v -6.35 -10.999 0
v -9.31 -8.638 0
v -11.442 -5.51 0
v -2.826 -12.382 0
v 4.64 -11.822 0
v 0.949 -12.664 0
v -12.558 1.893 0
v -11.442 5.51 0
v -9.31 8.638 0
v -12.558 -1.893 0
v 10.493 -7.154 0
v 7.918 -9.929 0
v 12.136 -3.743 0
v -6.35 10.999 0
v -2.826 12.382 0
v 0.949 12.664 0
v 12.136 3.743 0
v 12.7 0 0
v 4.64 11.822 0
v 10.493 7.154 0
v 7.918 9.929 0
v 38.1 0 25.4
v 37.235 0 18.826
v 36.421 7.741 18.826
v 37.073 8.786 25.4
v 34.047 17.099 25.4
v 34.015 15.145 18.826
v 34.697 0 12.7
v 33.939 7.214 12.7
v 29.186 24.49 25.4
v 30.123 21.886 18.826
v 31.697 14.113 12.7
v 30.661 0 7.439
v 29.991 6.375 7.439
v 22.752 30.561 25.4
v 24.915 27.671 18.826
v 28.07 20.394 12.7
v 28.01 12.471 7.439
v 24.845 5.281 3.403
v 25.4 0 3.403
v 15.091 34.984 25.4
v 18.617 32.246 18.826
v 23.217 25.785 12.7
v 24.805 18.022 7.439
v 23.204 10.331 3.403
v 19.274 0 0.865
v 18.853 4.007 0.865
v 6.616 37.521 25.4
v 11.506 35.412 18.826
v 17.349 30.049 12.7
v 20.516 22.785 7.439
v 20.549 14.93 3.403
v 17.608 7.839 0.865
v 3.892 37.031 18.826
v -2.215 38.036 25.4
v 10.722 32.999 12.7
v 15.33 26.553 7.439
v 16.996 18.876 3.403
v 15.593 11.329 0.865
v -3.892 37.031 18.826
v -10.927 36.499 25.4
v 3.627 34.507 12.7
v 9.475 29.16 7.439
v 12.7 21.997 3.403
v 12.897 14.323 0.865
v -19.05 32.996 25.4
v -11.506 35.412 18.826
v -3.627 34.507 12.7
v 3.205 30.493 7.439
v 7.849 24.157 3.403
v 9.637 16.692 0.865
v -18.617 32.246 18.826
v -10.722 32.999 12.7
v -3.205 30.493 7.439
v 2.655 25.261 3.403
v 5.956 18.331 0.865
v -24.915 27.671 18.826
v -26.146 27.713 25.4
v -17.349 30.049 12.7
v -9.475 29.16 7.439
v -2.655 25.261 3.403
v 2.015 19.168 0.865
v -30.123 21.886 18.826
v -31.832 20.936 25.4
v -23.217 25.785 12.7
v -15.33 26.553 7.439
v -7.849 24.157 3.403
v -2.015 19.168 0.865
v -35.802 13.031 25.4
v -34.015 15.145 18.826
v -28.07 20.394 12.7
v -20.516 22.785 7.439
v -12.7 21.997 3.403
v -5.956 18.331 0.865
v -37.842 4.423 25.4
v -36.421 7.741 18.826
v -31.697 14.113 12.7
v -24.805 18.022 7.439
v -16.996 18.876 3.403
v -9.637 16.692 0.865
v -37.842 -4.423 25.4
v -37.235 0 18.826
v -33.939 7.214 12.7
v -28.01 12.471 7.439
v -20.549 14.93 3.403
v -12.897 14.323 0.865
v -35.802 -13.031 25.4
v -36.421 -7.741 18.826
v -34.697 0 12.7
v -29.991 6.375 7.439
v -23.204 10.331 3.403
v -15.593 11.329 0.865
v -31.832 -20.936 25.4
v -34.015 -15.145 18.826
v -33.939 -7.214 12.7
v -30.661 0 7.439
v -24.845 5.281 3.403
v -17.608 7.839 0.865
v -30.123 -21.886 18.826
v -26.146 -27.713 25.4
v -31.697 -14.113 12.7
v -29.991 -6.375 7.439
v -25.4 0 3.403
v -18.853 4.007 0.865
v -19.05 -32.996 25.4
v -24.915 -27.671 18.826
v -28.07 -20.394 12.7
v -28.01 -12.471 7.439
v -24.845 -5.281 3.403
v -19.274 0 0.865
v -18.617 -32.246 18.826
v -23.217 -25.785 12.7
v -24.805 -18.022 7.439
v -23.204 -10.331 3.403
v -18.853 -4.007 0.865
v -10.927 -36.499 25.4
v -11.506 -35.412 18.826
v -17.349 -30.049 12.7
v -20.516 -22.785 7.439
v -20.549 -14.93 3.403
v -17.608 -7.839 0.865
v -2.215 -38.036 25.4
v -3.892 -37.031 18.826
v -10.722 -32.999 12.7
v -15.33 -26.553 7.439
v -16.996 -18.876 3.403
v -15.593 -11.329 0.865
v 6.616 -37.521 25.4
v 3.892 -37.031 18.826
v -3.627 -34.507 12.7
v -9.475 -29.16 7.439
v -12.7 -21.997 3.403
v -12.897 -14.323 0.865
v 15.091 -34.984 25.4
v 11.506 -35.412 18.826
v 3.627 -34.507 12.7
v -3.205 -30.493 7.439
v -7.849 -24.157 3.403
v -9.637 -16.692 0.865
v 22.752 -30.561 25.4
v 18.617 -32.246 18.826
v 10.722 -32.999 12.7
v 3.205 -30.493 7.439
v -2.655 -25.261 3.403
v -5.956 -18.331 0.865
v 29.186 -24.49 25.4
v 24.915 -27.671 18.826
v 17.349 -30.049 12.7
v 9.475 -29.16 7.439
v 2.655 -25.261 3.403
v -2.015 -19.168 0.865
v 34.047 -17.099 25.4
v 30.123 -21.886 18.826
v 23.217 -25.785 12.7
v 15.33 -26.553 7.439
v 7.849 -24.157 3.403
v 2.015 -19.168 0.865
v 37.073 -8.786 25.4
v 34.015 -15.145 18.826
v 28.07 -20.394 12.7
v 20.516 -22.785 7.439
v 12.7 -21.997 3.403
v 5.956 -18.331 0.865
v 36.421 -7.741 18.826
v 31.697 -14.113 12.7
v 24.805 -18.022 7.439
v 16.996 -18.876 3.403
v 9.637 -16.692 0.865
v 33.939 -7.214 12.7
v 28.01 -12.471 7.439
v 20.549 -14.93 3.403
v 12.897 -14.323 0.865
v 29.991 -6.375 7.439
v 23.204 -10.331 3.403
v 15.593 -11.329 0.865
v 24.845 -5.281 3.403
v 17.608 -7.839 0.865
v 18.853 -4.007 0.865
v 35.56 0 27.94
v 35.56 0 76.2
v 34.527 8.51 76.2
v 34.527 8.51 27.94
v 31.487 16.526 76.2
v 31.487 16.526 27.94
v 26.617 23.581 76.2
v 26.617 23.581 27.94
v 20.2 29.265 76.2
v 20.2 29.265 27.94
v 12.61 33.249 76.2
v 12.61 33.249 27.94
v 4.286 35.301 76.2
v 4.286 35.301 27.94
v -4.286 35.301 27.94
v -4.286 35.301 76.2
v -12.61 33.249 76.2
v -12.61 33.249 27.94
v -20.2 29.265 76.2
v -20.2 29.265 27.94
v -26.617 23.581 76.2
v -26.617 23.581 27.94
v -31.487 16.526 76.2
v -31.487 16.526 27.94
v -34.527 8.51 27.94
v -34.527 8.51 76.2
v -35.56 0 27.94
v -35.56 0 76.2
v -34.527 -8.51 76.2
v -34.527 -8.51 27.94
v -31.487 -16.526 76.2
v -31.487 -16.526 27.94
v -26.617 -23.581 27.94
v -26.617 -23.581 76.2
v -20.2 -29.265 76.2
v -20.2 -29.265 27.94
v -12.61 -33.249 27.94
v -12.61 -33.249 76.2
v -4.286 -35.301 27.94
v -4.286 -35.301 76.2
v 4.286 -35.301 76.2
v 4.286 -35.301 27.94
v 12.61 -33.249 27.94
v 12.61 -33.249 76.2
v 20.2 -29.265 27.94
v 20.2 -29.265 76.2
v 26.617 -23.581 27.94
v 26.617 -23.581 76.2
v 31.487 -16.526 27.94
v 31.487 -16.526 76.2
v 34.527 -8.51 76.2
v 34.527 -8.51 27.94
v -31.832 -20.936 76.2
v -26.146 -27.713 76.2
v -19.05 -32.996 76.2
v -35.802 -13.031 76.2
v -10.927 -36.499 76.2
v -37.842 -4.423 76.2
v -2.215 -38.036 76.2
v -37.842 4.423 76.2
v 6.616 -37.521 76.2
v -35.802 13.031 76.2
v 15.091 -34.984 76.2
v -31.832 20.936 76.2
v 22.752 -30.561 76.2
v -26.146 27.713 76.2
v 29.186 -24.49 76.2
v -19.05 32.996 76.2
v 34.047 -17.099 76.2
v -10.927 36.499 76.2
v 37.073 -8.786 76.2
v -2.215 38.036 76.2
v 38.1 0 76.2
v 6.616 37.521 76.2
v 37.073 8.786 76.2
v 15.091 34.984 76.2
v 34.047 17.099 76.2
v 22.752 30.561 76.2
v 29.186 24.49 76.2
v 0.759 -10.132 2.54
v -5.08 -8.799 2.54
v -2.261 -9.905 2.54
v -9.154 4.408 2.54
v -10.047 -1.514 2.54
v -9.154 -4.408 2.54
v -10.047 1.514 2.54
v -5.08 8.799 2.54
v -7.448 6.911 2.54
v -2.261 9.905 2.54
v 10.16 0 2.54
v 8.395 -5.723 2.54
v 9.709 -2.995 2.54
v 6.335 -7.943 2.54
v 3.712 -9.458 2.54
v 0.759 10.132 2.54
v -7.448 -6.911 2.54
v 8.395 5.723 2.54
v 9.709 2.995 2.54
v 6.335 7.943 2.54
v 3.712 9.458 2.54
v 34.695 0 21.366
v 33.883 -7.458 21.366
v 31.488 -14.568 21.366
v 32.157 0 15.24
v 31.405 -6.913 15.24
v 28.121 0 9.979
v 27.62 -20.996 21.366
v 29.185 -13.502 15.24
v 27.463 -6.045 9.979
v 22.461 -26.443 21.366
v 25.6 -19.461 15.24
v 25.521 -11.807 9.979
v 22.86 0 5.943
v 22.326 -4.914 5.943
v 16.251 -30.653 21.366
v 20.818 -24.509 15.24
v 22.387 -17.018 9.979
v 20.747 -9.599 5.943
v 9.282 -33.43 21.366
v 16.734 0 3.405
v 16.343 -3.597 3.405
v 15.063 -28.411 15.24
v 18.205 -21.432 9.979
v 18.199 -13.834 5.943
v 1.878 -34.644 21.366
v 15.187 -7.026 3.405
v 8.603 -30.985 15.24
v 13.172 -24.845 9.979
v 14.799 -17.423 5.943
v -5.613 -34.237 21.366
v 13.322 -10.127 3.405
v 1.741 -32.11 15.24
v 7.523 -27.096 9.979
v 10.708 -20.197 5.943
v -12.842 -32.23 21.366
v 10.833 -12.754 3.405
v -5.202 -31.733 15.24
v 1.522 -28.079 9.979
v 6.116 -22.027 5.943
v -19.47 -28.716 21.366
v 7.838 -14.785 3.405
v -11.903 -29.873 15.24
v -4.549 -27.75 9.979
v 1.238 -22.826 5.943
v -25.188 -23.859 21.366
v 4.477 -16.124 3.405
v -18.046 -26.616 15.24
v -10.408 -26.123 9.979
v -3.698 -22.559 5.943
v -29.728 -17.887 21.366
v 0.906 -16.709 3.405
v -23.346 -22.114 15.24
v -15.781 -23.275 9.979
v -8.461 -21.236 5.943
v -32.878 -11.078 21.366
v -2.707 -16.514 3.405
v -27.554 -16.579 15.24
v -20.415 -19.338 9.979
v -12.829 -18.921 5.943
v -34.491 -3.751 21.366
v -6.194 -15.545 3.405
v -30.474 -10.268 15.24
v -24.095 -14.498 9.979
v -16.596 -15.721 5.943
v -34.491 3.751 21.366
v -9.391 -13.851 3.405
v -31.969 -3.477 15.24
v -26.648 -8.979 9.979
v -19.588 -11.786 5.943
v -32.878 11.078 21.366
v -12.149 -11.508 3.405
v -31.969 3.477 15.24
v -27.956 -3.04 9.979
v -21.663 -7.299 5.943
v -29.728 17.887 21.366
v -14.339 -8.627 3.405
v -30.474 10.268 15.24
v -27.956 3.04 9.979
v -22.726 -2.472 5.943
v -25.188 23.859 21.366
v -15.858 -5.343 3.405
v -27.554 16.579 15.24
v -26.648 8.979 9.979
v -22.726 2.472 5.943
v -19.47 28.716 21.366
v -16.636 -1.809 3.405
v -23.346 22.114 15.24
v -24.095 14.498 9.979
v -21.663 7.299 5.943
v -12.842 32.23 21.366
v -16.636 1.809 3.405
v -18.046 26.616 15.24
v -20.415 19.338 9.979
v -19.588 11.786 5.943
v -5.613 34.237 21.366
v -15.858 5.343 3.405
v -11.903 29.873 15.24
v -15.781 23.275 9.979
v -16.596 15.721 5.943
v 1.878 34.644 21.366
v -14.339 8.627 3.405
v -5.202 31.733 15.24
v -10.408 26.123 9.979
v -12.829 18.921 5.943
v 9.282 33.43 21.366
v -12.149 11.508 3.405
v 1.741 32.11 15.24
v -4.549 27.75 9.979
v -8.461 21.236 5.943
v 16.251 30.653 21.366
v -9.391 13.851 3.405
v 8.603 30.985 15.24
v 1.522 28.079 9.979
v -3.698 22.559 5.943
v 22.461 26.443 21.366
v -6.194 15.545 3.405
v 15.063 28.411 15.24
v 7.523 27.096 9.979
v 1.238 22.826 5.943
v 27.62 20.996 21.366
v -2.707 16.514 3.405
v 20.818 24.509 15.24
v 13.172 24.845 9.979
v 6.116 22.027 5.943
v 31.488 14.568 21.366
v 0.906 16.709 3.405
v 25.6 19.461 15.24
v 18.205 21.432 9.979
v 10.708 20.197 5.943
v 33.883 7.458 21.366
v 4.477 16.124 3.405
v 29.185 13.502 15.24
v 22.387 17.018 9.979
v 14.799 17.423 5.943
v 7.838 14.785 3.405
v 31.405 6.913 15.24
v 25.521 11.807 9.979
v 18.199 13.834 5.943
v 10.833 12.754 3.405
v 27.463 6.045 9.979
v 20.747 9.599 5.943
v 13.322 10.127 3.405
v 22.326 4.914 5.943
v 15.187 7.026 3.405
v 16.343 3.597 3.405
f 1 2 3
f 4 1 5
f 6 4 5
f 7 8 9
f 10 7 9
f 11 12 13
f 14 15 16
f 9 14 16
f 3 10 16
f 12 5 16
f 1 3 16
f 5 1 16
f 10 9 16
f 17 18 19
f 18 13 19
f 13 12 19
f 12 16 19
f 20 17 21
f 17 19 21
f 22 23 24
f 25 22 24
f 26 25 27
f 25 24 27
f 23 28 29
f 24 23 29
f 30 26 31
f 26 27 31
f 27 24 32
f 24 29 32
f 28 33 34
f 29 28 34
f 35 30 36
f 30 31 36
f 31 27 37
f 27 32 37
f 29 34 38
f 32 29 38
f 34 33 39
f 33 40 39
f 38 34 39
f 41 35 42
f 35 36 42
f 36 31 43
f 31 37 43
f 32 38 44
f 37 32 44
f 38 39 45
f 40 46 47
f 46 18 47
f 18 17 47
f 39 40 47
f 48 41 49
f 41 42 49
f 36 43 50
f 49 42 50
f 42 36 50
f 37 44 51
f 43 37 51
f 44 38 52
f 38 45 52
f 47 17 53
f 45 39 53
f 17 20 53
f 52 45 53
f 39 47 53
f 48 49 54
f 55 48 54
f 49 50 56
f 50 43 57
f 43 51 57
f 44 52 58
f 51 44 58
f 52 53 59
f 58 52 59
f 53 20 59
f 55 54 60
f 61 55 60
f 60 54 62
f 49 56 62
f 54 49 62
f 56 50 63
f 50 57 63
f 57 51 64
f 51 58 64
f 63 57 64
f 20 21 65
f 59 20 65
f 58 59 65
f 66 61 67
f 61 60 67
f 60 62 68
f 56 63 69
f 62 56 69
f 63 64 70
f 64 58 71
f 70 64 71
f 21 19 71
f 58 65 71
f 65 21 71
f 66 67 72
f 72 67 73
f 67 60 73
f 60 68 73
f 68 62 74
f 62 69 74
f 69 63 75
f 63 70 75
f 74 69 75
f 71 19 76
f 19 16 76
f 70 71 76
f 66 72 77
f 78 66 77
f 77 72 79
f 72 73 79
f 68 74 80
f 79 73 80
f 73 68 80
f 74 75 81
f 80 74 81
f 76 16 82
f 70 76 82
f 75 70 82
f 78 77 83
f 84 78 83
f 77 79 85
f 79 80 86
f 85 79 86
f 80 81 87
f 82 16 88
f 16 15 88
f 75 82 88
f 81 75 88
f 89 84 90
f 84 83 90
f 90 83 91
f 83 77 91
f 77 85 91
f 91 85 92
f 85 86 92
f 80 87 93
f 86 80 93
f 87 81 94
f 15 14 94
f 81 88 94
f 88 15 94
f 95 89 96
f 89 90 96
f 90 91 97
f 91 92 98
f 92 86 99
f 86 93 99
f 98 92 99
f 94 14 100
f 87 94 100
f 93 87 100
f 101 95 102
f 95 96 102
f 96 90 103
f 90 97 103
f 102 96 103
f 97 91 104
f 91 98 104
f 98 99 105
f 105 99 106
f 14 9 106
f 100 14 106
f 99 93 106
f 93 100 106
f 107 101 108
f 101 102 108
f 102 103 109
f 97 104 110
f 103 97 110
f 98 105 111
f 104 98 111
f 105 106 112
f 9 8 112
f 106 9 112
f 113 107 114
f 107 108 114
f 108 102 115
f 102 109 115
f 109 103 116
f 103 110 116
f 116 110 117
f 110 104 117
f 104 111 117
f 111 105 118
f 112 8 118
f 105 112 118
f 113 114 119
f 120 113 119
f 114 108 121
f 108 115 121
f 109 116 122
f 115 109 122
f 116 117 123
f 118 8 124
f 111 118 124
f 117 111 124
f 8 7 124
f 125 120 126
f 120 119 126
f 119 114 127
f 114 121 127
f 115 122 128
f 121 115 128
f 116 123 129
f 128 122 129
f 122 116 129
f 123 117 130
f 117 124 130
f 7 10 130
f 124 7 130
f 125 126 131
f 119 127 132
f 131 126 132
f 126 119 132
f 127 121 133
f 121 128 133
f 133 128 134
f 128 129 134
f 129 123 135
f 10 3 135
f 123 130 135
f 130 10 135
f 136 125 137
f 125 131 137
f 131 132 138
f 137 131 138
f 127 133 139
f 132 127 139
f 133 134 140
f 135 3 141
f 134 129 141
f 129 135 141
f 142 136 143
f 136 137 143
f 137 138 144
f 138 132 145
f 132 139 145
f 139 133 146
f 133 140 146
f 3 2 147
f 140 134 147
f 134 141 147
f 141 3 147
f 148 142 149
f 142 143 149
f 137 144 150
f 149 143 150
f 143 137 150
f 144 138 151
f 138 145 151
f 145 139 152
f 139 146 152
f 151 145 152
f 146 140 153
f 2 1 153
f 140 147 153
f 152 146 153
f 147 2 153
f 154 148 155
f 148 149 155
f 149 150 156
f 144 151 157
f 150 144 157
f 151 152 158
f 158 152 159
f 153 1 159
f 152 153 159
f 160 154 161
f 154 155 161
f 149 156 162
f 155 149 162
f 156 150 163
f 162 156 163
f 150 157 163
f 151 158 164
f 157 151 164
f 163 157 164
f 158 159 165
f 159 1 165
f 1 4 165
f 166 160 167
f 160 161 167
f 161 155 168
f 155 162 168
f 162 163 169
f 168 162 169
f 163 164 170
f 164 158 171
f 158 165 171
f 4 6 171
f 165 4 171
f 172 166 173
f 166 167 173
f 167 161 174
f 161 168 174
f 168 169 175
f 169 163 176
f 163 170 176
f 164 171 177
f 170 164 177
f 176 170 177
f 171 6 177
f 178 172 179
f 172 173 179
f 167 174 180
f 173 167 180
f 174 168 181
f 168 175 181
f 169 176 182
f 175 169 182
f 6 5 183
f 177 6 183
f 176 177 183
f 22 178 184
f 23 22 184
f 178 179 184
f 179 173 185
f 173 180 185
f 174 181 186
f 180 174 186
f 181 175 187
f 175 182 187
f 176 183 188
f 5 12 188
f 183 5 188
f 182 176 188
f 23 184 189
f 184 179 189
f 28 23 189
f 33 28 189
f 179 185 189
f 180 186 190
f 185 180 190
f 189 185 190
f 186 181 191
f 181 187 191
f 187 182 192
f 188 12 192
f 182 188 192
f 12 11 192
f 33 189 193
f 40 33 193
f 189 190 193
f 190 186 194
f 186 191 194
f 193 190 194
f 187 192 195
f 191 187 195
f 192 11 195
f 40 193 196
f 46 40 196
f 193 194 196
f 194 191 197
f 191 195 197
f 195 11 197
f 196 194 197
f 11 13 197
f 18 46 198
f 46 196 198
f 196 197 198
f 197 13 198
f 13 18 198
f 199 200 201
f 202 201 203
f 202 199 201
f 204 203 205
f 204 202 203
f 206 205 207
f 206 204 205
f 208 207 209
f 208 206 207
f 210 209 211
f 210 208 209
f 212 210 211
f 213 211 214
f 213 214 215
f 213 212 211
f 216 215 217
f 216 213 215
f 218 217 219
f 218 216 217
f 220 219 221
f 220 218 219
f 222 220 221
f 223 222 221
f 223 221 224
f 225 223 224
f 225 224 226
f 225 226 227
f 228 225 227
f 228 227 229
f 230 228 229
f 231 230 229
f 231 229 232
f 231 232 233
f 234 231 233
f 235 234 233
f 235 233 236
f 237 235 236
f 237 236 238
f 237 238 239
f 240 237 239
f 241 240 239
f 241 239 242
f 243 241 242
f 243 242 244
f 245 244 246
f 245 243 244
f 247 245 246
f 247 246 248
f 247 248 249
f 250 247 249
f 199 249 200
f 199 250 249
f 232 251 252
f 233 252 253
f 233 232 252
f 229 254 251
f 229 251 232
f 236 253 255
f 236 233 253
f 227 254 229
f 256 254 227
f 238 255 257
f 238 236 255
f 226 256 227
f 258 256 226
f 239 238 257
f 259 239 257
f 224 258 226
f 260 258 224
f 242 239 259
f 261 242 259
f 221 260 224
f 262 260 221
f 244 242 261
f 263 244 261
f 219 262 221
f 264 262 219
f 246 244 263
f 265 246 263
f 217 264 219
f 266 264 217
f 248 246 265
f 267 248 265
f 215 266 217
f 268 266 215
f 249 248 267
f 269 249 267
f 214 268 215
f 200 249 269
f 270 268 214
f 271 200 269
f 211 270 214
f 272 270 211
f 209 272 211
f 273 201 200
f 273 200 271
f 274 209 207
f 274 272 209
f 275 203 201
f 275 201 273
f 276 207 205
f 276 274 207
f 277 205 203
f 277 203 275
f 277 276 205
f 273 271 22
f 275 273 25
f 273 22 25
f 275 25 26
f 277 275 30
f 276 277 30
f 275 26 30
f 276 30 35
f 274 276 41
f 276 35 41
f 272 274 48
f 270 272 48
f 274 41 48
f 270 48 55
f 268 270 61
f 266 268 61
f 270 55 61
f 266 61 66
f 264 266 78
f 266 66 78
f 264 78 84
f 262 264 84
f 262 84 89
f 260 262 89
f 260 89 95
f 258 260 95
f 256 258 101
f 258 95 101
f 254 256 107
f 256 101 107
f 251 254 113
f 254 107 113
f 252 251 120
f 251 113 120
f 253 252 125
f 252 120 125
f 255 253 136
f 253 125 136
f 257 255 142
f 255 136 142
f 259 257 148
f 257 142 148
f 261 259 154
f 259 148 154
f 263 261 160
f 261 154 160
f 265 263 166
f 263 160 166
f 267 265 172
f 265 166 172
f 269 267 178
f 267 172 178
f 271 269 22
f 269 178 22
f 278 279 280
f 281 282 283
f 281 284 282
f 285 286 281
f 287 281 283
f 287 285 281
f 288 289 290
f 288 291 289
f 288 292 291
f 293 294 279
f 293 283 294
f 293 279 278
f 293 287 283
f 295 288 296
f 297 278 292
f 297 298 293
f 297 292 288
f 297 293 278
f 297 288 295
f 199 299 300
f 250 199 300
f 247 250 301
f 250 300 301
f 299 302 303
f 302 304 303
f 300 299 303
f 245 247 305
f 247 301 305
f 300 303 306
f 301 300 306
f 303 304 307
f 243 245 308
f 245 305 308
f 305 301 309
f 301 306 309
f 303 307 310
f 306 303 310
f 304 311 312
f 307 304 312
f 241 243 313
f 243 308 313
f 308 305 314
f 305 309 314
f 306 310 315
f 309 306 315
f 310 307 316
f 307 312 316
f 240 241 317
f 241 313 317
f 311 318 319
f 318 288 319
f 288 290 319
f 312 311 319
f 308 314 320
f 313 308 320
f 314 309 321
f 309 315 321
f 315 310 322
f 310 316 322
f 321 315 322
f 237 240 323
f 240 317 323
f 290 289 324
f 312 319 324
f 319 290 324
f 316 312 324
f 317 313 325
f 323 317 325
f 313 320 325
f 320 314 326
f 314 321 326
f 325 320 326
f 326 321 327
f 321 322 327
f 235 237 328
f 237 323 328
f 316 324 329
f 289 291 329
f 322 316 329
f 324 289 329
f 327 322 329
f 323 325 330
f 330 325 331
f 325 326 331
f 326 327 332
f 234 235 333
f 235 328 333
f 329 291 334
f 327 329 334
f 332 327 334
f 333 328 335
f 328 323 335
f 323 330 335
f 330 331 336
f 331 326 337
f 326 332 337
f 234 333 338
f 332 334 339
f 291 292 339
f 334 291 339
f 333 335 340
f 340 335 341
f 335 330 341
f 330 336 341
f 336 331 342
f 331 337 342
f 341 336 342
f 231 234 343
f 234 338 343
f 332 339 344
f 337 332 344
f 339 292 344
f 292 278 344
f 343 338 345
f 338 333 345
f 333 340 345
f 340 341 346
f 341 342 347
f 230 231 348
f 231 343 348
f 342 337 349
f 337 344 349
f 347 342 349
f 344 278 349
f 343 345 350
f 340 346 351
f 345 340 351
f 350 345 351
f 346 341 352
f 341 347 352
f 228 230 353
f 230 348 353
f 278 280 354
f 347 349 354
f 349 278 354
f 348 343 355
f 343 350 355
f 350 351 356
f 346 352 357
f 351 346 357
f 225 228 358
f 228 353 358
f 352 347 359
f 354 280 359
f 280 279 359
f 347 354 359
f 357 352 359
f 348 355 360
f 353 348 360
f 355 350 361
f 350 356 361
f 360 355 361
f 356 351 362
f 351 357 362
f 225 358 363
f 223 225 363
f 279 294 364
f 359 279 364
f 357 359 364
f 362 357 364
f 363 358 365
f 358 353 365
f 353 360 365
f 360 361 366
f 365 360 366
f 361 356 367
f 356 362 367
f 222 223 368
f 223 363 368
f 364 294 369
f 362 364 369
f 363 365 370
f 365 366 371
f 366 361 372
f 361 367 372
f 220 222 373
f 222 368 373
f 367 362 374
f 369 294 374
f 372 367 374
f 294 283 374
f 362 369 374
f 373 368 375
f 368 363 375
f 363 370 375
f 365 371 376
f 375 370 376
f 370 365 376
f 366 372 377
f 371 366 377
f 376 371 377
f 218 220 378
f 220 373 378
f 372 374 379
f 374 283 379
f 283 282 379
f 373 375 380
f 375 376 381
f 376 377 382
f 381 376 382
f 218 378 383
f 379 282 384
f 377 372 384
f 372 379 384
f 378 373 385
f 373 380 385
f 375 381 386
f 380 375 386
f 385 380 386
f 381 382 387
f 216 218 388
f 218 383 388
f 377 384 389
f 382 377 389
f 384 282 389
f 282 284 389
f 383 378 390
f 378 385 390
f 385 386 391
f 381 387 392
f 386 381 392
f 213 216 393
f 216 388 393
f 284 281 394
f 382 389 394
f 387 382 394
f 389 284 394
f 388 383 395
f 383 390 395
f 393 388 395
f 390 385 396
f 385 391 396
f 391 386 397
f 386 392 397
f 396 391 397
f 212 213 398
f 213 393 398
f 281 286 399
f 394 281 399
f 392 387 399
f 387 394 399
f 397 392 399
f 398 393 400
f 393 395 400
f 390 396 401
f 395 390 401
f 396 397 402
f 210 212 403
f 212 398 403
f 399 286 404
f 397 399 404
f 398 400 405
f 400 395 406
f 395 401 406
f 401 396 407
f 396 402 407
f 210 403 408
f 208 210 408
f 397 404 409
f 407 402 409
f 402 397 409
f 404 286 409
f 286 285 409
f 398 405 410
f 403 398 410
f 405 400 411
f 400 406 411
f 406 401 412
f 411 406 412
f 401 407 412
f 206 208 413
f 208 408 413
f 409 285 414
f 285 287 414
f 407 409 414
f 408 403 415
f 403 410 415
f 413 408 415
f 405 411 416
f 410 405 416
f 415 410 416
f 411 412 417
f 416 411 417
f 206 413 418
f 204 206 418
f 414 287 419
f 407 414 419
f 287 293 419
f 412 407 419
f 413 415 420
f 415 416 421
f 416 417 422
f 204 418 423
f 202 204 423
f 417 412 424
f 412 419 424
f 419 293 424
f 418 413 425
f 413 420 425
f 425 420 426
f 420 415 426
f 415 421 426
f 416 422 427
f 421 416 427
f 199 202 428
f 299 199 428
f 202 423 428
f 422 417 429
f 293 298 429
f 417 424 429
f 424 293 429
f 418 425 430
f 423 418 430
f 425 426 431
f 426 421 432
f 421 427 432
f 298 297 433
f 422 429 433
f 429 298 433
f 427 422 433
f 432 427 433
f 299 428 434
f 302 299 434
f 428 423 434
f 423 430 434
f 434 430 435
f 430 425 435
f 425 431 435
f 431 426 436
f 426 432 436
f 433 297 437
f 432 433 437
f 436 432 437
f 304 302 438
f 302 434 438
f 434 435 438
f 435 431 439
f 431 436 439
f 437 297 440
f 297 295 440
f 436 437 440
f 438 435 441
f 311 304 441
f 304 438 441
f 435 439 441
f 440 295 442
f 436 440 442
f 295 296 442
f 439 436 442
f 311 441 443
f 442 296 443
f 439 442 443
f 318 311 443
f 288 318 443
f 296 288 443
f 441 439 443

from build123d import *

# Parameters (mm, degrees)
F0_R     = 42.0600289117
F1_DEPTH = 76.2
F2_T     = -2.54
F3_R     = 25.4
F4_R     = 39.5200289117
F5_DEPTH = 25.4
F8_R     = 38.1
F9_DEPTH = 76.2
F10_T    = -2.54
F11_R    = 25.4


with BuildPart() as f1:
    # F0 (on Top) → F1 (new body)
    with BuildSketch(Plane.XY):
        Circle(F0_R)
    extrude(amount=F1_DEPTH)

    # F2
    f2_openings = [f1.faces().sort_by_distance(p)[0] for p in [
        (0, 0, 76.2),
    ]]
    offset(amount=F2_T, openings=f2_openings)

    # F3
    f3_edges = [f1.edges().sort_by_distance(p)[0] for p in [
        (-39.520029, 0, 2.54),
        (-42.060029, 0, 0),
    ]]
    fillet(f3_edges, radius=F3_R)


with BuildPart() as f5:
    # F4 (on face) → F5 (new body)
    with BuildSketch(Plane.XY.offset(76.2)):
        Circle(F4_R)
    extrude(amount=F5_DEPTH)


with BuildPart() as f9:
    # F8 (on Top) → F9 (new body)
    with BuildSketch(Plane.XY):
        Circle(F8_R)
    extrude(amount=F9_DEPTH)

    # F10
    f10_openings = [f9.faces().sort_by_distance(p)[0] for p in [
        (0, 0, 76.2),
    ]]
    offset(amount=F10_T, openings=f10_openings)

    # F11
    f11_edges = [f9.edges().sort_by_distance(p)[0] for p in [
        (-35.56, 0, 2.54),
        (-38.1, 0, 0),
    ]]
    fillet(f11_edges, radius=F11_R)


solid = f9.part
